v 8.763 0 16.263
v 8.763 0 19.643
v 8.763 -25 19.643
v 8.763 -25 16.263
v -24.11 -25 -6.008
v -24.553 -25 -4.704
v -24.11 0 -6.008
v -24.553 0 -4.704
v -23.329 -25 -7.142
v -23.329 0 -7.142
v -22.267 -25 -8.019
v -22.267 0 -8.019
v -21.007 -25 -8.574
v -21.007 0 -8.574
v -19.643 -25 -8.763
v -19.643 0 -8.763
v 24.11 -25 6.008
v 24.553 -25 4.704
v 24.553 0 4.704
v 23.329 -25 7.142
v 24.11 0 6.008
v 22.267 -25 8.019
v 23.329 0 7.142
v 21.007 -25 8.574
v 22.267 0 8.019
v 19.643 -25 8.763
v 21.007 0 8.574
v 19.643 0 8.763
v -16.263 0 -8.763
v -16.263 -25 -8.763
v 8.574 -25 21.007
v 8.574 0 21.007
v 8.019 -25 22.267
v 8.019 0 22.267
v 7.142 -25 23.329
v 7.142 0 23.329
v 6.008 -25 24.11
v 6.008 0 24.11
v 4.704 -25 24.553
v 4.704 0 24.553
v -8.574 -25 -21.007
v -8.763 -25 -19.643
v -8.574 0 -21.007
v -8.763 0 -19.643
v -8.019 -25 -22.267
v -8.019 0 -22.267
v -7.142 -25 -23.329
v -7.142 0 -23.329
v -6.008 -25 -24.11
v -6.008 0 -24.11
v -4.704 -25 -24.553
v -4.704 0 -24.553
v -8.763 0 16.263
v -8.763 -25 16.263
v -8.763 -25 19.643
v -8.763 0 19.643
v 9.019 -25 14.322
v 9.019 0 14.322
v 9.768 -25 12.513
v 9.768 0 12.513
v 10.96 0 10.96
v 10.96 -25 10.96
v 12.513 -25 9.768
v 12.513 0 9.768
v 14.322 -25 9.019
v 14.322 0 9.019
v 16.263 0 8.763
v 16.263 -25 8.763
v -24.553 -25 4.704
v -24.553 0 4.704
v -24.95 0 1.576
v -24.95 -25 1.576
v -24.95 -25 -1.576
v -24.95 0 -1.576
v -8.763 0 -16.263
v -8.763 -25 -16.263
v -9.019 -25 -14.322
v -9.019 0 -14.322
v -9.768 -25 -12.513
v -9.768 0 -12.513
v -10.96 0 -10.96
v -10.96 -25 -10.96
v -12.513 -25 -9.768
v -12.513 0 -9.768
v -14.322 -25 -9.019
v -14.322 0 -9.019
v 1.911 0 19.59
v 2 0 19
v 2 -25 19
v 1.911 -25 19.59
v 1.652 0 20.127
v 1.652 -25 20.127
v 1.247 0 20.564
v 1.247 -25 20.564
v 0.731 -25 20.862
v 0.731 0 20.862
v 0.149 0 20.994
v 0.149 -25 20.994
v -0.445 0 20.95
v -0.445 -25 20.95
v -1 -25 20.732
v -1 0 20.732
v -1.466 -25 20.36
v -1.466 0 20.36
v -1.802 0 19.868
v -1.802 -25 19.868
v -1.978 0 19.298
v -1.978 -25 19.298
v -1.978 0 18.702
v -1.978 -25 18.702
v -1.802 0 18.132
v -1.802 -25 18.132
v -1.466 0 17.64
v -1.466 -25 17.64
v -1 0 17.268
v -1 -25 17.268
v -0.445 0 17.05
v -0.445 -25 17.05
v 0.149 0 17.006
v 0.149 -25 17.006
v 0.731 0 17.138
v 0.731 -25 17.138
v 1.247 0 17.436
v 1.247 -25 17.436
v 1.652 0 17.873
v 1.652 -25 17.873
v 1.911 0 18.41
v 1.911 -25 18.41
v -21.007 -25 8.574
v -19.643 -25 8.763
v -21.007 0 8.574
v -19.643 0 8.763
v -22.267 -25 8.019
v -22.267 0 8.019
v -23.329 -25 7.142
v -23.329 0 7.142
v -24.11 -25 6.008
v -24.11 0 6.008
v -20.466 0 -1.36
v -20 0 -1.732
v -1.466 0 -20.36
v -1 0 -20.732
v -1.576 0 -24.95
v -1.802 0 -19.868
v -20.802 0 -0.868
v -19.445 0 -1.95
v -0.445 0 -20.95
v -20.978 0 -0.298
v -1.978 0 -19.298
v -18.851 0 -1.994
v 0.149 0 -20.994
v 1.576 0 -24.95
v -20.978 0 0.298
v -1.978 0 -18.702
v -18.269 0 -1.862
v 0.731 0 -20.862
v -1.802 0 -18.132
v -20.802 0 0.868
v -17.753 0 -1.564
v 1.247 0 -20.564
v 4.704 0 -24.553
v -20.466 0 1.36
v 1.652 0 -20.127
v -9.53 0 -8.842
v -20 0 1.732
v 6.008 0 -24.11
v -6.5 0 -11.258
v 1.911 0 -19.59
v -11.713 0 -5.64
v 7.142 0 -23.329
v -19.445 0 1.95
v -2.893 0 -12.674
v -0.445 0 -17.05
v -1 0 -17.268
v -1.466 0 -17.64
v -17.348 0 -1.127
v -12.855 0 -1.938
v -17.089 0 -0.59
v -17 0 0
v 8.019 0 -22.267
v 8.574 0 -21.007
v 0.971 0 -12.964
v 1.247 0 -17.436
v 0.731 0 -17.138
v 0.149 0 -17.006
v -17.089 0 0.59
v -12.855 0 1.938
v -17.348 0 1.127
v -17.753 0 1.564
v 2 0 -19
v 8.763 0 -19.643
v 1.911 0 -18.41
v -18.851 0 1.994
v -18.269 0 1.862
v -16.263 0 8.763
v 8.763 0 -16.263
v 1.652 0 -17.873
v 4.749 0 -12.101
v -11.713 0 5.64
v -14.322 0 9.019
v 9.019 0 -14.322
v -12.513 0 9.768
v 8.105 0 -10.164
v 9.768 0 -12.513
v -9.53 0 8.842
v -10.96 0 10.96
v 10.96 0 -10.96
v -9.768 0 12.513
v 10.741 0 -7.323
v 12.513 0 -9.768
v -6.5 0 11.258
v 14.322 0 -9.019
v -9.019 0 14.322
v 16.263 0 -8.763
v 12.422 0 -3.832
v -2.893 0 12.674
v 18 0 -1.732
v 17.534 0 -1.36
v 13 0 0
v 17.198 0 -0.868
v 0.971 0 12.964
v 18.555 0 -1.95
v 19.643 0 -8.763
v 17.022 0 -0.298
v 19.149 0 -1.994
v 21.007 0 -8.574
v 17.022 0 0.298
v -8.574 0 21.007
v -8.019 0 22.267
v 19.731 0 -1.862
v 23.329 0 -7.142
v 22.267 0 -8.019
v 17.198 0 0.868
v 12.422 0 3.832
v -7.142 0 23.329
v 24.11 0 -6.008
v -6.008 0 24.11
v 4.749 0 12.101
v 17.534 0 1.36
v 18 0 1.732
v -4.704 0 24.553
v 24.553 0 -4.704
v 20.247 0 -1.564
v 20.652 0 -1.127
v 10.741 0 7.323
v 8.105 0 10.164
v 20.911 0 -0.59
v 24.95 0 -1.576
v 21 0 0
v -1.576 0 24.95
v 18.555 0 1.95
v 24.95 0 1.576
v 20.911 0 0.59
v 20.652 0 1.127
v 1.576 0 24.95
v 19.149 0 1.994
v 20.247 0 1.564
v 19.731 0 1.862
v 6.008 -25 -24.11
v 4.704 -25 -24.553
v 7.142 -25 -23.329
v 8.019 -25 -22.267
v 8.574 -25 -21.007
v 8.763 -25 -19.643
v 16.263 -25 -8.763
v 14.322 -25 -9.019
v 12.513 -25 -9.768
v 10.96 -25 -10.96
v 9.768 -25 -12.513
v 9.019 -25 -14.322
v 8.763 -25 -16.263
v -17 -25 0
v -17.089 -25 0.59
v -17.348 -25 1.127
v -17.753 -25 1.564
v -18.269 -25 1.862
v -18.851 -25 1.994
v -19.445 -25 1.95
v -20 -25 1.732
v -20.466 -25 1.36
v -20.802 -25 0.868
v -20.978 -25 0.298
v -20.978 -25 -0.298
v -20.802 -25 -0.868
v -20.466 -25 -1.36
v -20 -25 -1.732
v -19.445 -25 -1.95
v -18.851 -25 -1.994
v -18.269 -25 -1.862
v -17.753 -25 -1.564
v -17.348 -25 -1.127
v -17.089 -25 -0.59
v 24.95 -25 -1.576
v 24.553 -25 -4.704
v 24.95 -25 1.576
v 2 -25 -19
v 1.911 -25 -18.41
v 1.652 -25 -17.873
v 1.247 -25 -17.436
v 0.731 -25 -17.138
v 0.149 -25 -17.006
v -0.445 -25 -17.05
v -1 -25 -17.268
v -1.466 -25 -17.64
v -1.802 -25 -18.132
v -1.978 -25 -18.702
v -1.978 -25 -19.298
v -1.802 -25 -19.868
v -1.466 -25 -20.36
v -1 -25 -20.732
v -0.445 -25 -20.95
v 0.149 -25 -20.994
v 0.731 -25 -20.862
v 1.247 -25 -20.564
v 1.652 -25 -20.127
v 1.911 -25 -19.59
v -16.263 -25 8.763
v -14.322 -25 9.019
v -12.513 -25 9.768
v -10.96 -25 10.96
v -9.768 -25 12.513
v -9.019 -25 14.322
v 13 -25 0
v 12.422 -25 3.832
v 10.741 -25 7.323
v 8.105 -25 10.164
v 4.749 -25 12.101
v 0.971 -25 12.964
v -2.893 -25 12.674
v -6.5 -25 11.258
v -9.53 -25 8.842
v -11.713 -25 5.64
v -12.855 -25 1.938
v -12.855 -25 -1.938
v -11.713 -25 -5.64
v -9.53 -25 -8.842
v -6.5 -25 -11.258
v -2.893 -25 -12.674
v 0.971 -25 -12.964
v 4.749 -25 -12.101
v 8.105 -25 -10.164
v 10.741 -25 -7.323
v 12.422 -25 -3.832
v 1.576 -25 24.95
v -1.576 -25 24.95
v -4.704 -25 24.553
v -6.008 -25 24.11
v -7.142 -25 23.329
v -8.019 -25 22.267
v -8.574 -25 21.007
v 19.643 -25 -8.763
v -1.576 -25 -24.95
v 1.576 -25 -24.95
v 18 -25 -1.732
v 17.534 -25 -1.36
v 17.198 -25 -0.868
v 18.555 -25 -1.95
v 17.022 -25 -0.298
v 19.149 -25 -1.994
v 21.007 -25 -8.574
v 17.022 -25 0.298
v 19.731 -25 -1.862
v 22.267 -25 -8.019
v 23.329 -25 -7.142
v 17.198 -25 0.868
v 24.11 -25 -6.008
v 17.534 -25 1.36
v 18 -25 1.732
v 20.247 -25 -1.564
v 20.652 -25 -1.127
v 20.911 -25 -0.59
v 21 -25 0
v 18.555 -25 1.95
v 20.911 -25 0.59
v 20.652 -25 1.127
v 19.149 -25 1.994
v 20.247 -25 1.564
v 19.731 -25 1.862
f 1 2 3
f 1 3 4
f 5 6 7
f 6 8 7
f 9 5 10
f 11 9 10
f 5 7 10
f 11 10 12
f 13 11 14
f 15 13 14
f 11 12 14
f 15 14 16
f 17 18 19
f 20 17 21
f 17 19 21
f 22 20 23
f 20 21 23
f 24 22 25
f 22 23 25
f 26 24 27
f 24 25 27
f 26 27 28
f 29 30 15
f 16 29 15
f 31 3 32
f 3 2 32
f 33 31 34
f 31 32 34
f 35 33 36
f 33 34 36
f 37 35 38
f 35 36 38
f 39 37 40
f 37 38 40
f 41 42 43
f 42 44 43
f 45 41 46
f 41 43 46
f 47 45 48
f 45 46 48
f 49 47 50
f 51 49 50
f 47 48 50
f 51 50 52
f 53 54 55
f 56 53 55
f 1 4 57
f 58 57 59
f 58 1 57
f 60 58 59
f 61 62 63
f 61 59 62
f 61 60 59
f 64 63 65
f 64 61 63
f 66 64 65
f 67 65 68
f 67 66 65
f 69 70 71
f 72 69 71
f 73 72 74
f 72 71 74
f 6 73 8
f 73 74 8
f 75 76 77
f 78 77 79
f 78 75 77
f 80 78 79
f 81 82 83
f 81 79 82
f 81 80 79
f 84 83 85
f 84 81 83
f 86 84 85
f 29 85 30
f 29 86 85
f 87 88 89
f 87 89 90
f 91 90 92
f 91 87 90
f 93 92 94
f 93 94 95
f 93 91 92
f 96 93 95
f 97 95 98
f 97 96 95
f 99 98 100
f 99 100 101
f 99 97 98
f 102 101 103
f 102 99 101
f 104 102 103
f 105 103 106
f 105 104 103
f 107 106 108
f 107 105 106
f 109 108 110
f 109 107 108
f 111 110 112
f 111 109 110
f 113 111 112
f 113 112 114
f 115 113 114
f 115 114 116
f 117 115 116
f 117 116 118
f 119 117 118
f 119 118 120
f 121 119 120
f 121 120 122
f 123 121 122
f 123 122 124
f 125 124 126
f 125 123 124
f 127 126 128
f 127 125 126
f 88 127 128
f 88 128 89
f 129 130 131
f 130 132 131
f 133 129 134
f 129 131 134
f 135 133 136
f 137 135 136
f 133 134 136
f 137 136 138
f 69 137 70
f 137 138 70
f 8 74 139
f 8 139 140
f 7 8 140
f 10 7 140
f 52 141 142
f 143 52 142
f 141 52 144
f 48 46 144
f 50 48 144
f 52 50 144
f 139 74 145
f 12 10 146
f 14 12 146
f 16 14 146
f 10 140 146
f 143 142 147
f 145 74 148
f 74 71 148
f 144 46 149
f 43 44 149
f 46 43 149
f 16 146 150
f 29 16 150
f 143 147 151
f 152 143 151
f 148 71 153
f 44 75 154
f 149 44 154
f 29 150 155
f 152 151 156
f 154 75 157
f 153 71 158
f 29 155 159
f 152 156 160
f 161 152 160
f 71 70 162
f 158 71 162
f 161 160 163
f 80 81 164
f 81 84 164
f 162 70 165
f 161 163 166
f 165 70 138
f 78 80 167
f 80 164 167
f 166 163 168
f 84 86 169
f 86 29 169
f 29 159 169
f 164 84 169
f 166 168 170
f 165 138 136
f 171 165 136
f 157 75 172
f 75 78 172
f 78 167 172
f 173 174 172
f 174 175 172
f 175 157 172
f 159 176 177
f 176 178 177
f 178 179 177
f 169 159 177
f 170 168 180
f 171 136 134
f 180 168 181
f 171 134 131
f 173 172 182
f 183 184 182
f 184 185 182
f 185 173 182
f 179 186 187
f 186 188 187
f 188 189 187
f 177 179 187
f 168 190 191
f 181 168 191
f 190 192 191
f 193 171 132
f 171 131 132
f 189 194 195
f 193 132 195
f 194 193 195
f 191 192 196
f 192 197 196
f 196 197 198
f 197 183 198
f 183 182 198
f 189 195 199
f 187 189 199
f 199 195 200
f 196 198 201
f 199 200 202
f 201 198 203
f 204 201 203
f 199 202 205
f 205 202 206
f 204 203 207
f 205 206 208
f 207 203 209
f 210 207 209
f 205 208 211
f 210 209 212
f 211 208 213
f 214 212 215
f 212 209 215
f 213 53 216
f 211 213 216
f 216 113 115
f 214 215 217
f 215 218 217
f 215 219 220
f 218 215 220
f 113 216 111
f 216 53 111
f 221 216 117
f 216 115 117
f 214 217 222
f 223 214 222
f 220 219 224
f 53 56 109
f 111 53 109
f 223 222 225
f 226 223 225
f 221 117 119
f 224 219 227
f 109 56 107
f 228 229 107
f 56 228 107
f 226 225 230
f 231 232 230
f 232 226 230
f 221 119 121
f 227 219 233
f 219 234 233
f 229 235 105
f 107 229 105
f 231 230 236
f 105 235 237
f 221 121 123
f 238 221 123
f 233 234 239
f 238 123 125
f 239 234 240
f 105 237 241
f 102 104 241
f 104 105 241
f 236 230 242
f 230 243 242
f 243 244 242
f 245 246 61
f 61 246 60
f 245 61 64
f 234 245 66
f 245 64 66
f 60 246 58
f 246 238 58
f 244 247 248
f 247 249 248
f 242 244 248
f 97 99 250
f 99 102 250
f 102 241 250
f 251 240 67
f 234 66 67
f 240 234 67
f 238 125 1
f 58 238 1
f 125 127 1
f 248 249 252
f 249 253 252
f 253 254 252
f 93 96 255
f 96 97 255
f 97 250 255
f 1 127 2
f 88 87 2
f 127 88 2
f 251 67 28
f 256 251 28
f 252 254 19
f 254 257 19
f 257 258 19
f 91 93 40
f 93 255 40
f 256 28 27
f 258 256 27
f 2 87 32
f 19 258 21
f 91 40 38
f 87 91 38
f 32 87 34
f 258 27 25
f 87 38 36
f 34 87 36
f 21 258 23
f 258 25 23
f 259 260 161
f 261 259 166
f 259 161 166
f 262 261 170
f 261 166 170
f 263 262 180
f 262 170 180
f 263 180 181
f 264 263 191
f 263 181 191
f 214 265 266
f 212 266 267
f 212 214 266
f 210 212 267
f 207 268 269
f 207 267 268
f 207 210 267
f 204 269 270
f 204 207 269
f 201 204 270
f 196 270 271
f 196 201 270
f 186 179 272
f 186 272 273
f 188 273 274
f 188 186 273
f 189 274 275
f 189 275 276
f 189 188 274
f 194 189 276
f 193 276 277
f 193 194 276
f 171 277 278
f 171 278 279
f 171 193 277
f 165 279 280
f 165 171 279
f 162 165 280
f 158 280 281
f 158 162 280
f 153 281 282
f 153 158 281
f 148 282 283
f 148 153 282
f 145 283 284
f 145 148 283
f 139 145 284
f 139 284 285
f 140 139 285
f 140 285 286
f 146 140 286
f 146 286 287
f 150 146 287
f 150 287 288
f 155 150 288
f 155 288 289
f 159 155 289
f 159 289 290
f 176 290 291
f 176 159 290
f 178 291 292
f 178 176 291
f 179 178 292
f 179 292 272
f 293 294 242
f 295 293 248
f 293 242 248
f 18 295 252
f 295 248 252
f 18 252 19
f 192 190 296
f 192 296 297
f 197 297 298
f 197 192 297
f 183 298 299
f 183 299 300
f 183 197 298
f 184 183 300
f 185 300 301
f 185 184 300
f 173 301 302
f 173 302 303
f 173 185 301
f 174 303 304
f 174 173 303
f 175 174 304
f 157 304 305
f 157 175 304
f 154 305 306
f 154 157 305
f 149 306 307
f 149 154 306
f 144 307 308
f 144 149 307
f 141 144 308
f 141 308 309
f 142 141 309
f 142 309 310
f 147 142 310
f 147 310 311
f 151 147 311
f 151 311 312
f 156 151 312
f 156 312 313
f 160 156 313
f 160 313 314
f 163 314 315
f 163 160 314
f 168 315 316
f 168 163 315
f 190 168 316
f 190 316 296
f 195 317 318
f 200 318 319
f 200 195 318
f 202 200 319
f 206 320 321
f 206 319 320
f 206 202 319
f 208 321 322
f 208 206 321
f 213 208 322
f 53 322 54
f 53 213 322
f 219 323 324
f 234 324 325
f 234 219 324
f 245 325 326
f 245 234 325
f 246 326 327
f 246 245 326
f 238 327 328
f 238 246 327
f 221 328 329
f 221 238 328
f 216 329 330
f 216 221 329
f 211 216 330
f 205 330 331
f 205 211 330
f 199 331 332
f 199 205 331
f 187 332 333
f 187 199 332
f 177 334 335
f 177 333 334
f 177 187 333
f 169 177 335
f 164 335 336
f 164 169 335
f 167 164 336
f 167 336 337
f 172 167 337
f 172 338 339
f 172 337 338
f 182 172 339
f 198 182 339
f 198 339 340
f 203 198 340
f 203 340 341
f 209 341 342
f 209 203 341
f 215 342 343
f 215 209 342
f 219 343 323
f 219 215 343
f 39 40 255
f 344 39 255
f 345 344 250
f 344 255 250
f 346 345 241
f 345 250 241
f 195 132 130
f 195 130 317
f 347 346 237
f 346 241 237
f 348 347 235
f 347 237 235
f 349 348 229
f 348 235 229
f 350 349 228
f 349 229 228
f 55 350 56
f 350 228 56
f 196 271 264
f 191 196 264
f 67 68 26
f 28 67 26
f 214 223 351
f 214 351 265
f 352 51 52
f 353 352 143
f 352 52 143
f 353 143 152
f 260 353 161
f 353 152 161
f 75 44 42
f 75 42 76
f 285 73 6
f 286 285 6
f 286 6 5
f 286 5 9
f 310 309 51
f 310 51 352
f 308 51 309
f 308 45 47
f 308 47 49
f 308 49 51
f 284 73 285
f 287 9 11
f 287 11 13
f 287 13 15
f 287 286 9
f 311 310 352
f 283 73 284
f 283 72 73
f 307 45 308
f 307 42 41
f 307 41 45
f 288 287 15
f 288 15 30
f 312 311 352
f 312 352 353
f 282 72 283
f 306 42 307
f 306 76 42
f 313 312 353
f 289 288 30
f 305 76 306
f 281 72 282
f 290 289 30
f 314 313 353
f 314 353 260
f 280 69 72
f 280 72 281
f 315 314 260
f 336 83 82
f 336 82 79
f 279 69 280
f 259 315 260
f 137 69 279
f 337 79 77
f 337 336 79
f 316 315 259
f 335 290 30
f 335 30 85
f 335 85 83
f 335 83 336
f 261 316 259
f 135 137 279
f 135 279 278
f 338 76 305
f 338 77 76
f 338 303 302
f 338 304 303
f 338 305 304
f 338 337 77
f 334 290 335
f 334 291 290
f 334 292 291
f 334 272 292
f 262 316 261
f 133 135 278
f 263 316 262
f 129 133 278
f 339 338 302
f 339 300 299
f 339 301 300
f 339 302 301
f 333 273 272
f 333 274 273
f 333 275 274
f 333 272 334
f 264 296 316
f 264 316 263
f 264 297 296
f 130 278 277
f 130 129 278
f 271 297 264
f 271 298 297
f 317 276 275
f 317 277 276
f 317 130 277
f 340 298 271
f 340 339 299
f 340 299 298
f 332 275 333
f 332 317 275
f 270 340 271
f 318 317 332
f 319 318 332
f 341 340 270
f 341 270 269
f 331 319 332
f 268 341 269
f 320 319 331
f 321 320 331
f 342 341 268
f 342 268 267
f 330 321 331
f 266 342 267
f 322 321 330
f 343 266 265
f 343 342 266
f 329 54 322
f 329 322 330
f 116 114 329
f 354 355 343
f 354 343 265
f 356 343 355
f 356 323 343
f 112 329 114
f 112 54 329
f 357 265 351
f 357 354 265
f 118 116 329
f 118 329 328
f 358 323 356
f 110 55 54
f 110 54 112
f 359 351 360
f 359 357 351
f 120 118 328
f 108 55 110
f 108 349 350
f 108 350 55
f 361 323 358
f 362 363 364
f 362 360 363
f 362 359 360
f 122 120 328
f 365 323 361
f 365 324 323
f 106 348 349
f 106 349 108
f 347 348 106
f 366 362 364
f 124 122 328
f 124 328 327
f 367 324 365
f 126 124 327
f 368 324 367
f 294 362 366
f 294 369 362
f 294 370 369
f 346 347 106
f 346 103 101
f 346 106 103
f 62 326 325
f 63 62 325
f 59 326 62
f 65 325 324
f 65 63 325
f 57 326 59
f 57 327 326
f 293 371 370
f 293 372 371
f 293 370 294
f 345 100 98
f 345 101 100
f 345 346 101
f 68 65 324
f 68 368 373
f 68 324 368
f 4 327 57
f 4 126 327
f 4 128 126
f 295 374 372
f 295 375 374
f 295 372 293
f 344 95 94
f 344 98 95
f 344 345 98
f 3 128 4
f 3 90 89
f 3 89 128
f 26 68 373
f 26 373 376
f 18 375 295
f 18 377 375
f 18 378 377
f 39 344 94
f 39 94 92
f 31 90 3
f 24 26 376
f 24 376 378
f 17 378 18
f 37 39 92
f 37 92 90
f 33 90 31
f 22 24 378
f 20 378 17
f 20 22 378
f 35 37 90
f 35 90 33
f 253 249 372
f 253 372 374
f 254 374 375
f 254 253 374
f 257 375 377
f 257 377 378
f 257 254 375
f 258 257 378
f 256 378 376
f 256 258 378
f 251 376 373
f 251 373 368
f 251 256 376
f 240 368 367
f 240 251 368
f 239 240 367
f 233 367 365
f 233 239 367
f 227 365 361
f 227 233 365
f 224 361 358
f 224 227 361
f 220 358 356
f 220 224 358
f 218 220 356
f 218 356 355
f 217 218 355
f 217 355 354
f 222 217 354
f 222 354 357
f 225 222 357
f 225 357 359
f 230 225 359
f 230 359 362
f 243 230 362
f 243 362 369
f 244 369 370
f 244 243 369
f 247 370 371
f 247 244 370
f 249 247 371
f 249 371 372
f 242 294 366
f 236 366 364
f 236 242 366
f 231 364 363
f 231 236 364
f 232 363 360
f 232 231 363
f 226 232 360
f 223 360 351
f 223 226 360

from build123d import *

# Parameters (mm, degrees)
F0_R     = 25
F0_R_2   = 2
F1_DEPTH = 25
F3_DEPTH = 25.001
F4_R     = 5
F5_R     = 13
F6_DEPTH = 25.001


with BuildPart() as f1:
    # F0 (on Front) → F1 (new body)
    with BuildSketch(Plane.XZ):
        Circle(F0_R)
        with Locations((0, -19)):
            Circle(F0_R_2, mode=Mode.SUBTRACT)
        with Locations((-19, 0)):
            Circle(F0_R_2, mode=Mode.SUBTRACT)
        with Locations((19, 0)):
            Circle(F0_R_2, mode=Mode.SUBTRACT)
        with Locations((0, 19)):
            Circle(F0_R_2, mode=Mode.SUBTRACT)
    extrude(amount=F1_DEPTH)

    # F2 (on Front) → F3 (cut, through all)
    with BuildSketch(Plane.XZ):
        with BuildLine():
            Line((-23.7634559673, 8.7634559673), (-16.2634559673, 8.7634559673))
            ThreePointArc((-16.2634559673, 8.7634559673), (-10.9601551084, 10.9601551084), (-8.7634559673, 16.2634559673))
            Line((-8.7634559673, 16.2634559673), (-8.7634559673, 23.7634559673))
            Line((-8.7634559673, 23.7634559673), (-23.7634559673, 23.7634559673))
            Line((-23.7634559673, 23.7634559673), (-23.7634559673, 8.7634559673))
        make_face()
        with BuildLine():
            Line((8.7634559673, 23.7634559673), (8.7634559673, 16.2634559673))
            ThreePointArc((8.7634559673, 16.2634559673), (10.9601551084, 10.9601551084), (16.2634559673, 8.7634559673))
            Line((16.2634559673, 8.7634559673), (23.7634559673, 8.7634559673))
            Line((23.7634559673, 8.7634559673), (23.7634559673, 23.7634559673))
            Line((23.7634559673, 23.7634559673), (8.7634559673, 23.7634559673))
        make_face()
        with BuildLine():
            ThreePointArc((-8.7634559673, -16.2634559673), (-10.9601551084, -10.9601551084), (-16.2634559673, -8.7634559673))
            Line((-16.2634559673, -8.7634559673), (-23.7634559673, -8.7634559673))
            Line((-23.7634559673, -8.7634559673), (-23.7634559673, -23.7634559673))
            Line((-23.7634559673, -23.7634559673), (-8.7634559673, -23.7634559673))
            Line((-8.7634559673, -23.7634559673), (-8.7634559673, -16.2634559673))
        make_face()
        with BuildLine():
            ThreePointArc((16.2634559673, -8.7634559673), (10.9601551084, -10.9601551084), (8.7634559673, -16.2634559673))
            Line((8.7634559673, -16.2634559673), (8.7634559673, -23.7634559673))
            Line((8.7634559673, -23.7634559673), (23.7634559673, -23.7634559673))
            Line((23.7634559673, -23.7634559673), (23.7634559673, -8.7634559673))
            Line((23.7634559673, -8.7634559673), (16.2634559673, -8.7634559673))
        make_face()
    extrude(amount=F3_DEPTH, mode=Mode.SUBTRACT)

    # F4
    f4_edges = [f1.edges().sort_by_distance(p)[0] for p in [
        (8.763456, -12.5, 23.413711),
        (-8.763456, -12.5, 23.413711),
        (-23.413711, -12.5, 8.763456),
        (-23.413711, -12.5, -8.763456),
        (-8.763456, -12.5, -23.413711),
        (8.763456, -12.5, -23.413711),
        (23.413711, -12.5, -8.763456),
        (23.413711, -12.5, 8.763456),
    ]]
    fillet(f4_edges, radius=F4_R)

    # F5 (on Front) → F6 (cut, through all)
    with BuildSketch(Plane.XZ):
        Circle(F5_R)
    extrude(amount=F6_DEPTH, mode=Mode.SUBTRACT)


solid = f1.part
